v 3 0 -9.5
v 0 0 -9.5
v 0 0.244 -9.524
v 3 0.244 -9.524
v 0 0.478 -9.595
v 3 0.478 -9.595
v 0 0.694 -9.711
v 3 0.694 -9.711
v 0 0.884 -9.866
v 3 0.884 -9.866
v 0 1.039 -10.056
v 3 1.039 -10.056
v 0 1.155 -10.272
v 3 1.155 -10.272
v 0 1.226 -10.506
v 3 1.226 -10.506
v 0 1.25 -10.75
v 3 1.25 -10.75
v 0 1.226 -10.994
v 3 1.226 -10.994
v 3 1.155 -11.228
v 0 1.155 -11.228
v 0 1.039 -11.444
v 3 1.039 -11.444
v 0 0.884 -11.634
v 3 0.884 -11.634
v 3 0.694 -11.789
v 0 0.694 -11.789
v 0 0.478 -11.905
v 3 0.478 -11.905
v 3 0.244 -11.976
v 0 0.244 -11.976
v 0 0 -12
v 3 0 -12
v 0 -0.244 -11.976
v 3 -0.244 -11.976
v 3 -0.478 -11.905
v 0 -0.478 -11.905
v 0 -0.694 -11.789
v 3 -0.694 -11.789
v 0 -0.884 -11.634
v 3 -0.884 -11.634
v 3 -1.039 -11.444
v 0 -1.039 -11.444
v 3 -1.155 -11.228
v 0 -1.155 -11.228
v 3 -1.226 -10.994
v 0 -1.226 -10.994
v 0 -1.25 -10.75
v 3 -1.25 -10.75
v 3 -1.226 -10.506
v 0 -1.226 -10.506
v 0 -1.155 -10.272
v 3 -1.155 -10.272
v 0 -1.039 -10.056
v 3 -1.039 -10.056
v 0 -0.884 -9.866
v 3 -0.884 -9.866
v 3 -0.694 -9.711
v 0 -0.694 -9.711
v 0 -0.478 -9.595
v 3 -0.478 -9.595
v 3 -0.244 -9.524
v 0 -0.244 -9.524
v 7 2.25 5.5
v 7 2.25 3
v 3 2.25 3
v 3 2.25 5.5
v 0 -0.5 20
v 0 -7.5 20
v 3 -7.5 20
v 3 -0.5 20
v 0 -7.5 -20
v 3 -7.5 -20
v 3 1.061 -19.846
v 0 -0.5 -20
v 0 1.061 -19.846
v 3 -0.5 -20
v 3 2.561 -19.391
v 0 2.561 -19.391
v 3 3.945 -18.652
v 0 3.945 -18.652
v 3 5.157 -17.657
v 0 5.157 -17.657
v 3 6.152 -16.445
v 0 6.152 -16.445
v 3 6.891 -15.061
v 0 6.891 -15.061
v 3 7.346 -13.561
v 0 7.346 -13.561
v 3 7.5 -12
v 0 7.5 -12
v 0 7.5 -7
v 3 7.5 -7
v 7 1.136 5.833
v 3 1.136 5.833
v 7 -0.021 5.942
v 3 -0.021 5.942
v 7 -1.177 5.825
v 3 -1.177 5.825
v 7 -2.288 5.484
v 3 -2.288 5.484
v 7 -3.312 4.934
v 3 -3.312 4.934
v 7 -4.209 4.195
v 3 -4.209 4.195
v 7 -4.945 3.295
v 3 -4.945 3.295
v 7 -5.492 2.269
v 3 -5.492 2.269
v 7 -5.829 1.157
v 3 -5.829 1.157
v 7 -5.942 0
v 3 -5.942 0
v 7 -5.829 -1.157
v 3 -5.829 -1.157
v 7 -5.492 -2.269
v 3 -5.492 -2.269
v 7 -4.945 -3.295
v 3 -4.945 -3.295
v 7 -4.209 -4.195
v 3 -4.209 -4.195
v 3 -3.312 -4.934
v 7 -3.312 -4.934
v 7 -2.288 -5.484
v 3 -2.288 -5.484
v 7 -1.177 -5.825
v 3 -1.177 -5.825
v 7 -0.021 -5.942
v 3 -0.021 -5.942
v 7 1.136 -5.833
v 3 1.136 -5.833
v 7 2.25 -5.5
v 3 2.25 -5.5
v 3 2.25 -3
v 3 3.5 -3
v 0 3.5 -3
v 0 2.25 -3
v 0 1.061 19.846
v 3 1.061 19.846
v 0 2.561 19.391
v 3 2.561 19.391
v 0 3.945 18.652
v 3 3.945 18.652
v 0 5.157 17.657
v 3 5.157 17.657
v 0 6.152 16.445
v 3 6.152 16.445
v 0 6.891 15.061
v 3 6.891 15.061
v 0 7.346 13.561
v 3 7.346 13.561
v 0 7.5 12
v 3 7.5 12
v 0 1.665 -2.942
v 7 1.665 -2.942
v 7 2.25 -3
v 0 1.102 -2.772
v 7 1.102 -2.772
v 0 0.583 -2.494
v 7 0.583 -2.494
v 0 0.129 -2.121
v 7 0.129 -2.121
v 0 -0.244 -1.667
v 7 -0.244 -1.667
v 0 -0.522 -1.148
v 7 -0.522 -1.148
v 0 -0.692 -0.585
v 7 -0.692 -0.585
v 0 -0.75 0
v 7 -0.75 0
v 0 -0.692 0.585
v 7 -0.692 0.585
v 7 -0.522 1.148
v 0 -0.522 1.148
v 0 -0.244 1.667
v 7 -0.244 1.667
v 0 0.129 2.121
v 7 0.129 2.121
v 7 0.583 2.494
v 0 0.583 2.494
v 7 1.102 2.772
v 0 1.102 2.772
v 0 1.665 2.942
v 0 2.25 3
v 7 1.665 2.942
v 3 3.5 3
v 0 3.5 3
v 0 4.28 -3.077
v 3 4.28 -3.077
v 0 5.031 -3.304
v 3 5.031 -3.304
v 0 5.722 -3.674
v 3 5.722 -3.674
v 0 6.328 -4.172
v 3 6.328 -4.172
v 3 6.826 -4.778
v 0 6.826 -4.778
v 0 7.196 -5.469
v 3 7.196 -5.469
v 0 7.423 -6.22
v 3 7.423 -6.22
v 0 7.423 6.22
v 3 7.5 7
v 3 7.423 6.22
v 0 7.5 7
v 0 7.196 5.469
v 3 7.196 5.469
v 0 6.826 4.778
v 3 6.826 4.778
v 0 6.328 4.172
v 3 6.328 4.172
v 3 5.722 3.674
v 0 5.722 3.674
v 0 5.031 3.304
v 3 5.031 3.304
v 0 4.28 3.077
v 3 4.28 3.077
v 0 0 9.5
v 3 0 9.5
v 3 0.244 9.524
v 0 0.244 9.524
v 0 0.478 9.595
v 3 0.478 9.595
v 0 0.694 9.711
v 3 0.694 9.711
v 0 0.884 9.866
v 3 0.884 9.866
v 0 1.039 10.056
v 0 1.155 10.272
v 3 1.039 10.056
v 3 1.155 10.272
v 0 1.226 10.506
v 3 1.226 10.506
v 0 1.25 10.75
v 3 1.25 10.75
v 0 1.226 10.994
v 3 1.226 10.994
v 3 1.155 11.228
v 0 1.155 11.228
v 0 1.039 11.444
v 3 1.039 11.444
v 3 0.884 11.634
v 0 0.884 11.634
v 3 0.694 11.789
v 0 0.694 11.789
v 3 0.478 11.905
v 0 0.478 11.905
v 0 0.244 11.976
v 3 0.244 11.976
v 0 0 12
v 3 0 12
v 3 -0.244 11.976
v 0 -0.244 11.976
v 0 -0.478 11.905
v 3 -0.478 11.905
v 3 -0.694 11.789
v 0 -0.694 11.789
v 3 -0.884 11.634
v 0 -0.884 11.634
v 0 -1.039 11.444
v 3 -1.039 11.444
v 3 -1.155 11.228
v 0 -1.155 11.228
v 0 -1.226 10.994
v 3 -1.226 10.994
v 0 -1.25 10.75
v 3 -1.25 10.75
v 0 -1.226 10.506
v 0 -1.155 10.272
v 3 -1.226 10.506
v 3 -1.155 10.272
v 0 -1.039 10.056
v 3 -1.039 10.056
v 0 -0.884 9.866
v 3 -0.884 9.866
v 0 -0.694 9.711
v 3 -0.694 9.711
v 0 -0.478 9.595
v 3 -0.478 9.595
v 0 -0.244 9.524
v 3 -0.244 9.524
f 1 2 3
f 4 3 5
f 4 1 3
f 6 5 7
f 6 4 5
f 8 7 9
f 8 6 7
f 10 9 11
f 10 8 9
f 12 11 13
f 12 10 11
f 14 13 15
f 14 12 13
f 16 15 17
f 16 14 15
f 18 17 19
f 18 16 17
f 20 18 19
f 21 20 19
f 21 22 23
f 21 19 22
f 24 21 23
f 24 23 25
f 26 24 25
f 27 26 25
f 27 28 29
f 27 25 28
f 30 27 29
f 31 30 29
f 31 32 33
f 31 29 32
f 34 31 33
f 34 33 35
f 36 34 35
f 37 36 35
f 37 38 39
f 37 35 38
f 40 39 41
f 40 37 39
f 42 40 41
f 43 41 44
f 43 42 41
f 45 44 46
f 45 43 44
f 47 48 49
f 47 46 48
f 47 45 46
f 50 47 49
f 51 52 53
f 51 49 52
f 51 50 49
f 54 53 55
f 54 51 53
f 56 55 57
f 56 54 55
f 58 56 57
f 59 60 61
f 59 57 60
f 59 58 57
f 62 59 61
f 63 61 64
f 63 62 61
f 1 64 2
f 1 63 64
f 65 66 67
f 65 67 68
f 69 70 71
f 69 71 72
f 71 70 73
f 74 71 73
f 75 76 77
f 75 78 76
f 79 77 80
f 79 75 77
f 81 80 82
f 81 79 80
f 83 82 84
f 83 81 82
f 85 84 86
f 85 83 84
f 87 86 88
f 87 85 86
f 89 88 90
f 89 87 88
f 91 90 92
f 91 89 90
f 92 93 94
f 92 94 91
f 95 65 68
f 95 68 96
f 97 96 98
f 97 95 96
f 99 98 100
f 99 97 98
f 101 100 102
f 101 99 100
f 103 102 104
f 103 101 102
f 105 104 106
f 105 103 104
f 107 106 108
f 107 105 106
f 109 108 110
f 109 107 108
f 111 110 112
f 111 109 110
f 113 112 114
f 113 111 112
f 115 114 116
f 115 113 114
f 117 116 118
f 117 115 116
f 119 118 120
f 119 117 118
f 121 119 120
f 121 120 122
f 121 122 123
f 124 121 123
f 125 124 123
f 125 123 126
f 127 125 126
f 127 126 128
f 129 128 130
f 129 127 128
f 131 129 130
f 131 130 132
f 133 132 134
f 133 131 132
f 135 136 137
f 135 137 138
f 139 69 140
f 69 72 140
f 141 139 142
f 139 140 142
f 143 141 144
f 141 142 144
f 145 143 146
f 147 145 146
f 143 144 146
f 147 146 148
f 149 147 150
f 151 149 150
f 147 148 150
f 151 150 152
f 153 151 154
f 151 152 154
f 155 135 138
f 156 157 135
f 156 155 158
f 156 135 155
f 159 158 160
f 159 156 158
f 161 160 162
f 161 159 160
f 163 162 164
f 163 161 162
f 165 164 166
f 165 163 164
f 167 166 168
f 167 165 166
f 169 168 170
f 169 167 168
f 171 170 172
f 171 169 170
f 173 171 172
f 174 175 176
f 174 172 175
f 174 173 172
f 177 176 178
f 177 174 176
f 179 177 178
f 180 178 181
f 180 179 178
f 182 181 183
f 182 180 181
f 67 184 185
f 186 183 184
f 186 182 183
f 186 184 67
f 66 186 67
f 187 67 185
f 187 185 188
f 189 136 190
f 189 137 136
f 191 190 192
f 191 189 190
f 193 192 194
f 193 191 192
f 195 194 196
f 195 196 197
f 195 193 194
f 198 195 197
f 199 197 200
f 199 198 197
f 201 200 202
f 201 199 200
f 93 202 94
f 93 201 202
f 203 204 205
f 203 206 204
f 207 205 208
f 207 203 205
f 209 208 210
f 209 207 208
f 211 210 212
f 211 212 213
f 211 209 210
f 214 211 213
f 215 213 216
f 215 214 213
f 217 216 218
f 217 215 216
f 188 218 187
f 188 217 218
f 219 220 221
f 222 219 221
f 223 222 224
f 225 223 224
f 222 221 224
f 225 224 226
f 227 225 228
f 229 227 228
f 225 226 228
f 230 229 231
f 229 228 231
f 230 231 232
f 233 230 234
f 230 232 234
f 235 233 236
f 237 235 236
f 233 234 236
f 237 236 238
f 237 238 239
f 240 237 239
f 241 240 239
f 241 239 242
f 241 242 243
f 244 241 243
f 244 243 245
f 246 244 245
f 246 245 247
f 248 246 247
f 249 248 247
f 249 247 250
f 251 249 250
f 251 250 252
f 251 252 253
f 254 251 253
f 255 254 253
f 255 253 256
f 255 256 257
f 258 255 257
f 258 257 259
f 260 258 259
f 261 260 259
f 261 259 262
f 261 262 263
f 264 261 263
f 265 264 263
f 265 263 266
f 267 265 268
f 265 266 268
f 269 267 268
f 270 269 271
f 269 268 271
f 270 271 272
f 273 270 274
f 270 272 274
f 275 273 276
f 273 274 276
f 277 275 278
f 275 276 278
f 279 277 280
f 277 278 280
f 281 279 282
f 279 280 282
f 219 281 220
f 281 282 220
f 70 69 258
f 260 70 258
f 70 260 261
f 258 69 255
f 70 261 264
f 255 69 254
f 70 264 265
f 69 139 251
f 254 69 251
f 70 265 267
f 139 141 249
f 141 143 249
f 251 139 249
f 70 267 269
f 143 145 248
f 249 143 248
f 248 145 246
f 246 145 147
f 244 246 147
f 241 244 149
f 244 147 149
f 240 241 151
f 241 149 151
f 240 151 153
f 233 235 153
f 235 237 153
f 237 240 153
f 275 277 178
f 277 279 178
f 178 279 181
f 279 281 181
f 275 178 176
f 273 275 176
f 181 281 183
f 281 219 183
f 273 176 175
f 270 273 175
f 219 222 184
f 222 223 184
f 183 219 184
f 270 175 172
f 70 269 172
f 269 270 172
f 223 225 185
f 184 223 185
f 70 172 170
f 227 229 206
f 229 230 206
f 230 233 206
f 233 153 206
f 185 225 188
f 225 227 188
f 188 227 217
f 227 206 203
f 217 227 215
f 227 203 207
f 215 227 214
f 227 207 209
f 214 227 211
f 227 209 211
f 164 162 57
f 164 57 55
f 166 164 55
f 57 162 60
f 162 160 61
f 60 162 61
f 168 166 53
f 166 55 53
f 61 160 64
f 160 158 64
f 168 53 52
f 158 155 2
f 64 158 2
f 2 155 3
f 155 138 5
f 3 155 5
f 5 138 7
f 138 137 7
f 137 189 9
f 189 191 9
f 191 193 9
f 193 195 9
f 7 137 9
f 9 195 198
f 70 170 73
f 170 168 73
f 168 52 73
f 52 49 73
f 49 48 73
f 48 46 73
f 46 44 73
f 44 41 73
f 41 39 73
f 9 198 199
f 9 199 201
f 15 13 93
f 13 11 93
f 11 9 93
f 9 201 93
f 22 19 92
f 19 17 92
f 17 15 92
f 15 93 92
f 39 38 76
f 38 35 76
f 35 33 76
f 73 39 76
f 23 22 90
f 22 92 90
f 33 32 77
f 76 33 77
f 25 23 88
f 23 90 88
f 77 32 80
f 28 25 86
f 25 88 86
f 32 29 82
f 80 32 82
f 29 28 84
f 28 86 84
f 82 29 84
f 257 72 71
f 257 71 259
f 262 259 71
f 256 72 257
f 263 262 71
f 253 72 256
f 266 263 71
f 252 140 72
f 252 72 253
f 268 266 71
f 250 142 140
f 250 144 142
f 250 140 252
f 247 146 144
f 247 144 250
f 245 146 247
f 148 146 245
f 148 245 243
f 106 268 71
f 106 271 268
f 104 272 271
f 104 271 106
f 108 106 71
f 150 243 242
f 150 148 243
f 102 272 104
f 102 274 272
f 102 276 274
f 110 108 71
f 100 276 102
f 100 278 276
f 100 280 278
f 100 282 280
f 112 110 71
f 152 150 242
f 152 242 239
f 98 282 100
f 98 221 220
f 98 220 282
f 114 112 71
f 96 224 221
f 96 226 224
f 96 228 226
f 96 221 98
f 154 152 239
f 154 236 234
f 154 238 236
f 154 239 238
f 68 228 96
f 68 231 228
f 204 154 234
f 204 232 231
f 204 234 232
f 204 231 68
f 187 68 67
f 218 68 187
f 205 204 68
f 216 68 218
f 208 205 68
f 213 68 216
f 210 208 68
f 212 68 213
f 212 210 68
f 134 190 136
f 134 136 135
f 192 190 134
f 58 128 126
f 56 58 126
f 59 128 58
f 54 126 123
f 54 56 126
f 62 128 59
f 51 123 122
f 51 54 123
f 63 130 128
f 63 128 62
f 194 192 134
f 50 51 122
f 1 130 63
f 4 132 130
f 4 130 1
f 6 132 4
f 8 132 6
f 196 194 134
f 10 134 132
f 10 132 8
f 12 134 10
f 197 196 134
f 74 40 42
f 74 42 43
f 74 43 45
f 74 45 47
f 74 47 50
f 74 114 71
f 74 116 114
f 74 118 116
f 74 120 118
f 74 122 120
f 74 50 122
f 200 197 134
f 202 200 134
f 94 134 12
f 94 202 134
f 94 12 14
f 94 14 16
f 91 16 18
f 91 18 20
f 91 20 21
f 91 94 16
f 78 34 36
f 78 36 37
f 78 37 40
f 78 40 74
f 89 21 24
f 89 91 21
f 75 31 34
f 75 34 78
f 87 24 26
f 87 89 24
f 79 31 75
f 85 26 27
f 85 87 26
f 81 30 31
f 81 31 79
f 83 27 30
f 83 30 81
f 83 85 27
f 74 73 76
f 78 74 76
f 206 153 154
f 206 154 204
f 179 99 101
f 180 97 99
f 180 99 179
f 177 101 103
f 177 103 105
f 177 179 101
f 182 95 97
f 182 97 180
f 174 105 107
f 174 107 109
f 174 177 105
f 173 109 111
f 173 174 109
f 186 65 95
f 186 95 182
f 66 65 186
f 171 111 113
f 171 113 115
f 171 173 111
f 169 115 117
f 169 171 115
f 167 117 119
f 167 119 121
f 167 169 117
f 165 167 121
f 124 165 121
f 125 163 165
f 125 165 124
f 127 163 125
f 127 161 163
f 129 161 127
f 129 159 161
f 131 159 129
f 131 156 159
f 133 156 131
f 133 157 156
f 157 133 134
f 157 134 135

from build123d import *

# Parameters (mm, degrees)
SKETCH1_W           = 40
SKETCH1_H           = 15
BOSS_EXTRUDE1_DEPTH = 3
SKETCH2_R           = 1.25
CUT_EXTRUDE1_DEPTH  = 5
FILLET1_R           = 8
BOSS_EXTRUDE2_START = 4
BOSS_EXTRUDE2_DEPTH = 4
FILLET2_R           = 4


with BuildPart() as part:
    # Sketch1 → Boss-Extrude1 (new body)
    with BuildSketch(Plane(origin=(0, 0, 0), x_dir=(0, 0, -1), z_dir=(1, 0, 0))):
        Rectangle(SKETCH1_W, SKETCH1_H)
    extrude(amount=BOSS_EXTRUDE1_DEPTH)

    # Sketch2 → Cut-Extrude1 (cut)
    with BuildSketch(Plane(origin=(3, 0, 0), x_dir=(0, 0, -1), z_dir=(1, 0, 0))):
        with Locations((-10.75, 0)):
            Circle(SKETCH2_R)
        with BuildLine():
            Line((-3, 2.25), (-3, 7.5))
            Line((-3, 7.5), (3, 7.5))
            Line((3, 7.5), (3, 2.25))
            ThreePointArc((3, 2.25), (0, -0.75), (-3, 2.25))
        make_face()
    cut_extrude1 = extrude(amount=-CUT_EXTRUDE1_DEPTH, mode=Mode.SUBTRACT)

    # Mirror1: Cut-Extrude1 across plane
    add(cut_extrude1.mirror(Plane.XY), mode=Mode.SUBTRACT)

    # Fillet1
    fillet1_edges = [part.edges().sort_by_distance(p)[0] for p in [
        (1.5, 7.5, 20),
        (1.5, 7.5, -20),
    ]]
    fillet(fillet1_edges, radius=FILLET1_R)

    # Sketch3 → Boss-Extrude2 (add)
    with BuildSketch(Plane(origin=(3, 0, 0), x_dir=(0, 0, -1), z_dir=(1, 0, 0)).offset(BOSS_EXTRUDE2_START)):
        with BuildLine():
            Line((-3, 2.25), (-5.5, 2.25))
            ThreePointArc((-5.5, 2.25), (0, -5.942432162), (5.5, 2.25))
            Line((5.5, 2.25), (3, 2.25))
            ThreePointArc((3, 2.25), (0, -0.75), (-3, 2.25))
        make_face()
    extrude(amount=-BOSS_EXTRUDE2_DEPTH)

    # Fillet2
    fillet2_edges = [part.edges().sort_by_distance(p)[0] for p in [
        (1.5, 7.5, 3),
        (1.5, 7.5, -3),
    ]]
    fillet(fillet2_edges, radius=FILLET2_R)


solid = part.part
